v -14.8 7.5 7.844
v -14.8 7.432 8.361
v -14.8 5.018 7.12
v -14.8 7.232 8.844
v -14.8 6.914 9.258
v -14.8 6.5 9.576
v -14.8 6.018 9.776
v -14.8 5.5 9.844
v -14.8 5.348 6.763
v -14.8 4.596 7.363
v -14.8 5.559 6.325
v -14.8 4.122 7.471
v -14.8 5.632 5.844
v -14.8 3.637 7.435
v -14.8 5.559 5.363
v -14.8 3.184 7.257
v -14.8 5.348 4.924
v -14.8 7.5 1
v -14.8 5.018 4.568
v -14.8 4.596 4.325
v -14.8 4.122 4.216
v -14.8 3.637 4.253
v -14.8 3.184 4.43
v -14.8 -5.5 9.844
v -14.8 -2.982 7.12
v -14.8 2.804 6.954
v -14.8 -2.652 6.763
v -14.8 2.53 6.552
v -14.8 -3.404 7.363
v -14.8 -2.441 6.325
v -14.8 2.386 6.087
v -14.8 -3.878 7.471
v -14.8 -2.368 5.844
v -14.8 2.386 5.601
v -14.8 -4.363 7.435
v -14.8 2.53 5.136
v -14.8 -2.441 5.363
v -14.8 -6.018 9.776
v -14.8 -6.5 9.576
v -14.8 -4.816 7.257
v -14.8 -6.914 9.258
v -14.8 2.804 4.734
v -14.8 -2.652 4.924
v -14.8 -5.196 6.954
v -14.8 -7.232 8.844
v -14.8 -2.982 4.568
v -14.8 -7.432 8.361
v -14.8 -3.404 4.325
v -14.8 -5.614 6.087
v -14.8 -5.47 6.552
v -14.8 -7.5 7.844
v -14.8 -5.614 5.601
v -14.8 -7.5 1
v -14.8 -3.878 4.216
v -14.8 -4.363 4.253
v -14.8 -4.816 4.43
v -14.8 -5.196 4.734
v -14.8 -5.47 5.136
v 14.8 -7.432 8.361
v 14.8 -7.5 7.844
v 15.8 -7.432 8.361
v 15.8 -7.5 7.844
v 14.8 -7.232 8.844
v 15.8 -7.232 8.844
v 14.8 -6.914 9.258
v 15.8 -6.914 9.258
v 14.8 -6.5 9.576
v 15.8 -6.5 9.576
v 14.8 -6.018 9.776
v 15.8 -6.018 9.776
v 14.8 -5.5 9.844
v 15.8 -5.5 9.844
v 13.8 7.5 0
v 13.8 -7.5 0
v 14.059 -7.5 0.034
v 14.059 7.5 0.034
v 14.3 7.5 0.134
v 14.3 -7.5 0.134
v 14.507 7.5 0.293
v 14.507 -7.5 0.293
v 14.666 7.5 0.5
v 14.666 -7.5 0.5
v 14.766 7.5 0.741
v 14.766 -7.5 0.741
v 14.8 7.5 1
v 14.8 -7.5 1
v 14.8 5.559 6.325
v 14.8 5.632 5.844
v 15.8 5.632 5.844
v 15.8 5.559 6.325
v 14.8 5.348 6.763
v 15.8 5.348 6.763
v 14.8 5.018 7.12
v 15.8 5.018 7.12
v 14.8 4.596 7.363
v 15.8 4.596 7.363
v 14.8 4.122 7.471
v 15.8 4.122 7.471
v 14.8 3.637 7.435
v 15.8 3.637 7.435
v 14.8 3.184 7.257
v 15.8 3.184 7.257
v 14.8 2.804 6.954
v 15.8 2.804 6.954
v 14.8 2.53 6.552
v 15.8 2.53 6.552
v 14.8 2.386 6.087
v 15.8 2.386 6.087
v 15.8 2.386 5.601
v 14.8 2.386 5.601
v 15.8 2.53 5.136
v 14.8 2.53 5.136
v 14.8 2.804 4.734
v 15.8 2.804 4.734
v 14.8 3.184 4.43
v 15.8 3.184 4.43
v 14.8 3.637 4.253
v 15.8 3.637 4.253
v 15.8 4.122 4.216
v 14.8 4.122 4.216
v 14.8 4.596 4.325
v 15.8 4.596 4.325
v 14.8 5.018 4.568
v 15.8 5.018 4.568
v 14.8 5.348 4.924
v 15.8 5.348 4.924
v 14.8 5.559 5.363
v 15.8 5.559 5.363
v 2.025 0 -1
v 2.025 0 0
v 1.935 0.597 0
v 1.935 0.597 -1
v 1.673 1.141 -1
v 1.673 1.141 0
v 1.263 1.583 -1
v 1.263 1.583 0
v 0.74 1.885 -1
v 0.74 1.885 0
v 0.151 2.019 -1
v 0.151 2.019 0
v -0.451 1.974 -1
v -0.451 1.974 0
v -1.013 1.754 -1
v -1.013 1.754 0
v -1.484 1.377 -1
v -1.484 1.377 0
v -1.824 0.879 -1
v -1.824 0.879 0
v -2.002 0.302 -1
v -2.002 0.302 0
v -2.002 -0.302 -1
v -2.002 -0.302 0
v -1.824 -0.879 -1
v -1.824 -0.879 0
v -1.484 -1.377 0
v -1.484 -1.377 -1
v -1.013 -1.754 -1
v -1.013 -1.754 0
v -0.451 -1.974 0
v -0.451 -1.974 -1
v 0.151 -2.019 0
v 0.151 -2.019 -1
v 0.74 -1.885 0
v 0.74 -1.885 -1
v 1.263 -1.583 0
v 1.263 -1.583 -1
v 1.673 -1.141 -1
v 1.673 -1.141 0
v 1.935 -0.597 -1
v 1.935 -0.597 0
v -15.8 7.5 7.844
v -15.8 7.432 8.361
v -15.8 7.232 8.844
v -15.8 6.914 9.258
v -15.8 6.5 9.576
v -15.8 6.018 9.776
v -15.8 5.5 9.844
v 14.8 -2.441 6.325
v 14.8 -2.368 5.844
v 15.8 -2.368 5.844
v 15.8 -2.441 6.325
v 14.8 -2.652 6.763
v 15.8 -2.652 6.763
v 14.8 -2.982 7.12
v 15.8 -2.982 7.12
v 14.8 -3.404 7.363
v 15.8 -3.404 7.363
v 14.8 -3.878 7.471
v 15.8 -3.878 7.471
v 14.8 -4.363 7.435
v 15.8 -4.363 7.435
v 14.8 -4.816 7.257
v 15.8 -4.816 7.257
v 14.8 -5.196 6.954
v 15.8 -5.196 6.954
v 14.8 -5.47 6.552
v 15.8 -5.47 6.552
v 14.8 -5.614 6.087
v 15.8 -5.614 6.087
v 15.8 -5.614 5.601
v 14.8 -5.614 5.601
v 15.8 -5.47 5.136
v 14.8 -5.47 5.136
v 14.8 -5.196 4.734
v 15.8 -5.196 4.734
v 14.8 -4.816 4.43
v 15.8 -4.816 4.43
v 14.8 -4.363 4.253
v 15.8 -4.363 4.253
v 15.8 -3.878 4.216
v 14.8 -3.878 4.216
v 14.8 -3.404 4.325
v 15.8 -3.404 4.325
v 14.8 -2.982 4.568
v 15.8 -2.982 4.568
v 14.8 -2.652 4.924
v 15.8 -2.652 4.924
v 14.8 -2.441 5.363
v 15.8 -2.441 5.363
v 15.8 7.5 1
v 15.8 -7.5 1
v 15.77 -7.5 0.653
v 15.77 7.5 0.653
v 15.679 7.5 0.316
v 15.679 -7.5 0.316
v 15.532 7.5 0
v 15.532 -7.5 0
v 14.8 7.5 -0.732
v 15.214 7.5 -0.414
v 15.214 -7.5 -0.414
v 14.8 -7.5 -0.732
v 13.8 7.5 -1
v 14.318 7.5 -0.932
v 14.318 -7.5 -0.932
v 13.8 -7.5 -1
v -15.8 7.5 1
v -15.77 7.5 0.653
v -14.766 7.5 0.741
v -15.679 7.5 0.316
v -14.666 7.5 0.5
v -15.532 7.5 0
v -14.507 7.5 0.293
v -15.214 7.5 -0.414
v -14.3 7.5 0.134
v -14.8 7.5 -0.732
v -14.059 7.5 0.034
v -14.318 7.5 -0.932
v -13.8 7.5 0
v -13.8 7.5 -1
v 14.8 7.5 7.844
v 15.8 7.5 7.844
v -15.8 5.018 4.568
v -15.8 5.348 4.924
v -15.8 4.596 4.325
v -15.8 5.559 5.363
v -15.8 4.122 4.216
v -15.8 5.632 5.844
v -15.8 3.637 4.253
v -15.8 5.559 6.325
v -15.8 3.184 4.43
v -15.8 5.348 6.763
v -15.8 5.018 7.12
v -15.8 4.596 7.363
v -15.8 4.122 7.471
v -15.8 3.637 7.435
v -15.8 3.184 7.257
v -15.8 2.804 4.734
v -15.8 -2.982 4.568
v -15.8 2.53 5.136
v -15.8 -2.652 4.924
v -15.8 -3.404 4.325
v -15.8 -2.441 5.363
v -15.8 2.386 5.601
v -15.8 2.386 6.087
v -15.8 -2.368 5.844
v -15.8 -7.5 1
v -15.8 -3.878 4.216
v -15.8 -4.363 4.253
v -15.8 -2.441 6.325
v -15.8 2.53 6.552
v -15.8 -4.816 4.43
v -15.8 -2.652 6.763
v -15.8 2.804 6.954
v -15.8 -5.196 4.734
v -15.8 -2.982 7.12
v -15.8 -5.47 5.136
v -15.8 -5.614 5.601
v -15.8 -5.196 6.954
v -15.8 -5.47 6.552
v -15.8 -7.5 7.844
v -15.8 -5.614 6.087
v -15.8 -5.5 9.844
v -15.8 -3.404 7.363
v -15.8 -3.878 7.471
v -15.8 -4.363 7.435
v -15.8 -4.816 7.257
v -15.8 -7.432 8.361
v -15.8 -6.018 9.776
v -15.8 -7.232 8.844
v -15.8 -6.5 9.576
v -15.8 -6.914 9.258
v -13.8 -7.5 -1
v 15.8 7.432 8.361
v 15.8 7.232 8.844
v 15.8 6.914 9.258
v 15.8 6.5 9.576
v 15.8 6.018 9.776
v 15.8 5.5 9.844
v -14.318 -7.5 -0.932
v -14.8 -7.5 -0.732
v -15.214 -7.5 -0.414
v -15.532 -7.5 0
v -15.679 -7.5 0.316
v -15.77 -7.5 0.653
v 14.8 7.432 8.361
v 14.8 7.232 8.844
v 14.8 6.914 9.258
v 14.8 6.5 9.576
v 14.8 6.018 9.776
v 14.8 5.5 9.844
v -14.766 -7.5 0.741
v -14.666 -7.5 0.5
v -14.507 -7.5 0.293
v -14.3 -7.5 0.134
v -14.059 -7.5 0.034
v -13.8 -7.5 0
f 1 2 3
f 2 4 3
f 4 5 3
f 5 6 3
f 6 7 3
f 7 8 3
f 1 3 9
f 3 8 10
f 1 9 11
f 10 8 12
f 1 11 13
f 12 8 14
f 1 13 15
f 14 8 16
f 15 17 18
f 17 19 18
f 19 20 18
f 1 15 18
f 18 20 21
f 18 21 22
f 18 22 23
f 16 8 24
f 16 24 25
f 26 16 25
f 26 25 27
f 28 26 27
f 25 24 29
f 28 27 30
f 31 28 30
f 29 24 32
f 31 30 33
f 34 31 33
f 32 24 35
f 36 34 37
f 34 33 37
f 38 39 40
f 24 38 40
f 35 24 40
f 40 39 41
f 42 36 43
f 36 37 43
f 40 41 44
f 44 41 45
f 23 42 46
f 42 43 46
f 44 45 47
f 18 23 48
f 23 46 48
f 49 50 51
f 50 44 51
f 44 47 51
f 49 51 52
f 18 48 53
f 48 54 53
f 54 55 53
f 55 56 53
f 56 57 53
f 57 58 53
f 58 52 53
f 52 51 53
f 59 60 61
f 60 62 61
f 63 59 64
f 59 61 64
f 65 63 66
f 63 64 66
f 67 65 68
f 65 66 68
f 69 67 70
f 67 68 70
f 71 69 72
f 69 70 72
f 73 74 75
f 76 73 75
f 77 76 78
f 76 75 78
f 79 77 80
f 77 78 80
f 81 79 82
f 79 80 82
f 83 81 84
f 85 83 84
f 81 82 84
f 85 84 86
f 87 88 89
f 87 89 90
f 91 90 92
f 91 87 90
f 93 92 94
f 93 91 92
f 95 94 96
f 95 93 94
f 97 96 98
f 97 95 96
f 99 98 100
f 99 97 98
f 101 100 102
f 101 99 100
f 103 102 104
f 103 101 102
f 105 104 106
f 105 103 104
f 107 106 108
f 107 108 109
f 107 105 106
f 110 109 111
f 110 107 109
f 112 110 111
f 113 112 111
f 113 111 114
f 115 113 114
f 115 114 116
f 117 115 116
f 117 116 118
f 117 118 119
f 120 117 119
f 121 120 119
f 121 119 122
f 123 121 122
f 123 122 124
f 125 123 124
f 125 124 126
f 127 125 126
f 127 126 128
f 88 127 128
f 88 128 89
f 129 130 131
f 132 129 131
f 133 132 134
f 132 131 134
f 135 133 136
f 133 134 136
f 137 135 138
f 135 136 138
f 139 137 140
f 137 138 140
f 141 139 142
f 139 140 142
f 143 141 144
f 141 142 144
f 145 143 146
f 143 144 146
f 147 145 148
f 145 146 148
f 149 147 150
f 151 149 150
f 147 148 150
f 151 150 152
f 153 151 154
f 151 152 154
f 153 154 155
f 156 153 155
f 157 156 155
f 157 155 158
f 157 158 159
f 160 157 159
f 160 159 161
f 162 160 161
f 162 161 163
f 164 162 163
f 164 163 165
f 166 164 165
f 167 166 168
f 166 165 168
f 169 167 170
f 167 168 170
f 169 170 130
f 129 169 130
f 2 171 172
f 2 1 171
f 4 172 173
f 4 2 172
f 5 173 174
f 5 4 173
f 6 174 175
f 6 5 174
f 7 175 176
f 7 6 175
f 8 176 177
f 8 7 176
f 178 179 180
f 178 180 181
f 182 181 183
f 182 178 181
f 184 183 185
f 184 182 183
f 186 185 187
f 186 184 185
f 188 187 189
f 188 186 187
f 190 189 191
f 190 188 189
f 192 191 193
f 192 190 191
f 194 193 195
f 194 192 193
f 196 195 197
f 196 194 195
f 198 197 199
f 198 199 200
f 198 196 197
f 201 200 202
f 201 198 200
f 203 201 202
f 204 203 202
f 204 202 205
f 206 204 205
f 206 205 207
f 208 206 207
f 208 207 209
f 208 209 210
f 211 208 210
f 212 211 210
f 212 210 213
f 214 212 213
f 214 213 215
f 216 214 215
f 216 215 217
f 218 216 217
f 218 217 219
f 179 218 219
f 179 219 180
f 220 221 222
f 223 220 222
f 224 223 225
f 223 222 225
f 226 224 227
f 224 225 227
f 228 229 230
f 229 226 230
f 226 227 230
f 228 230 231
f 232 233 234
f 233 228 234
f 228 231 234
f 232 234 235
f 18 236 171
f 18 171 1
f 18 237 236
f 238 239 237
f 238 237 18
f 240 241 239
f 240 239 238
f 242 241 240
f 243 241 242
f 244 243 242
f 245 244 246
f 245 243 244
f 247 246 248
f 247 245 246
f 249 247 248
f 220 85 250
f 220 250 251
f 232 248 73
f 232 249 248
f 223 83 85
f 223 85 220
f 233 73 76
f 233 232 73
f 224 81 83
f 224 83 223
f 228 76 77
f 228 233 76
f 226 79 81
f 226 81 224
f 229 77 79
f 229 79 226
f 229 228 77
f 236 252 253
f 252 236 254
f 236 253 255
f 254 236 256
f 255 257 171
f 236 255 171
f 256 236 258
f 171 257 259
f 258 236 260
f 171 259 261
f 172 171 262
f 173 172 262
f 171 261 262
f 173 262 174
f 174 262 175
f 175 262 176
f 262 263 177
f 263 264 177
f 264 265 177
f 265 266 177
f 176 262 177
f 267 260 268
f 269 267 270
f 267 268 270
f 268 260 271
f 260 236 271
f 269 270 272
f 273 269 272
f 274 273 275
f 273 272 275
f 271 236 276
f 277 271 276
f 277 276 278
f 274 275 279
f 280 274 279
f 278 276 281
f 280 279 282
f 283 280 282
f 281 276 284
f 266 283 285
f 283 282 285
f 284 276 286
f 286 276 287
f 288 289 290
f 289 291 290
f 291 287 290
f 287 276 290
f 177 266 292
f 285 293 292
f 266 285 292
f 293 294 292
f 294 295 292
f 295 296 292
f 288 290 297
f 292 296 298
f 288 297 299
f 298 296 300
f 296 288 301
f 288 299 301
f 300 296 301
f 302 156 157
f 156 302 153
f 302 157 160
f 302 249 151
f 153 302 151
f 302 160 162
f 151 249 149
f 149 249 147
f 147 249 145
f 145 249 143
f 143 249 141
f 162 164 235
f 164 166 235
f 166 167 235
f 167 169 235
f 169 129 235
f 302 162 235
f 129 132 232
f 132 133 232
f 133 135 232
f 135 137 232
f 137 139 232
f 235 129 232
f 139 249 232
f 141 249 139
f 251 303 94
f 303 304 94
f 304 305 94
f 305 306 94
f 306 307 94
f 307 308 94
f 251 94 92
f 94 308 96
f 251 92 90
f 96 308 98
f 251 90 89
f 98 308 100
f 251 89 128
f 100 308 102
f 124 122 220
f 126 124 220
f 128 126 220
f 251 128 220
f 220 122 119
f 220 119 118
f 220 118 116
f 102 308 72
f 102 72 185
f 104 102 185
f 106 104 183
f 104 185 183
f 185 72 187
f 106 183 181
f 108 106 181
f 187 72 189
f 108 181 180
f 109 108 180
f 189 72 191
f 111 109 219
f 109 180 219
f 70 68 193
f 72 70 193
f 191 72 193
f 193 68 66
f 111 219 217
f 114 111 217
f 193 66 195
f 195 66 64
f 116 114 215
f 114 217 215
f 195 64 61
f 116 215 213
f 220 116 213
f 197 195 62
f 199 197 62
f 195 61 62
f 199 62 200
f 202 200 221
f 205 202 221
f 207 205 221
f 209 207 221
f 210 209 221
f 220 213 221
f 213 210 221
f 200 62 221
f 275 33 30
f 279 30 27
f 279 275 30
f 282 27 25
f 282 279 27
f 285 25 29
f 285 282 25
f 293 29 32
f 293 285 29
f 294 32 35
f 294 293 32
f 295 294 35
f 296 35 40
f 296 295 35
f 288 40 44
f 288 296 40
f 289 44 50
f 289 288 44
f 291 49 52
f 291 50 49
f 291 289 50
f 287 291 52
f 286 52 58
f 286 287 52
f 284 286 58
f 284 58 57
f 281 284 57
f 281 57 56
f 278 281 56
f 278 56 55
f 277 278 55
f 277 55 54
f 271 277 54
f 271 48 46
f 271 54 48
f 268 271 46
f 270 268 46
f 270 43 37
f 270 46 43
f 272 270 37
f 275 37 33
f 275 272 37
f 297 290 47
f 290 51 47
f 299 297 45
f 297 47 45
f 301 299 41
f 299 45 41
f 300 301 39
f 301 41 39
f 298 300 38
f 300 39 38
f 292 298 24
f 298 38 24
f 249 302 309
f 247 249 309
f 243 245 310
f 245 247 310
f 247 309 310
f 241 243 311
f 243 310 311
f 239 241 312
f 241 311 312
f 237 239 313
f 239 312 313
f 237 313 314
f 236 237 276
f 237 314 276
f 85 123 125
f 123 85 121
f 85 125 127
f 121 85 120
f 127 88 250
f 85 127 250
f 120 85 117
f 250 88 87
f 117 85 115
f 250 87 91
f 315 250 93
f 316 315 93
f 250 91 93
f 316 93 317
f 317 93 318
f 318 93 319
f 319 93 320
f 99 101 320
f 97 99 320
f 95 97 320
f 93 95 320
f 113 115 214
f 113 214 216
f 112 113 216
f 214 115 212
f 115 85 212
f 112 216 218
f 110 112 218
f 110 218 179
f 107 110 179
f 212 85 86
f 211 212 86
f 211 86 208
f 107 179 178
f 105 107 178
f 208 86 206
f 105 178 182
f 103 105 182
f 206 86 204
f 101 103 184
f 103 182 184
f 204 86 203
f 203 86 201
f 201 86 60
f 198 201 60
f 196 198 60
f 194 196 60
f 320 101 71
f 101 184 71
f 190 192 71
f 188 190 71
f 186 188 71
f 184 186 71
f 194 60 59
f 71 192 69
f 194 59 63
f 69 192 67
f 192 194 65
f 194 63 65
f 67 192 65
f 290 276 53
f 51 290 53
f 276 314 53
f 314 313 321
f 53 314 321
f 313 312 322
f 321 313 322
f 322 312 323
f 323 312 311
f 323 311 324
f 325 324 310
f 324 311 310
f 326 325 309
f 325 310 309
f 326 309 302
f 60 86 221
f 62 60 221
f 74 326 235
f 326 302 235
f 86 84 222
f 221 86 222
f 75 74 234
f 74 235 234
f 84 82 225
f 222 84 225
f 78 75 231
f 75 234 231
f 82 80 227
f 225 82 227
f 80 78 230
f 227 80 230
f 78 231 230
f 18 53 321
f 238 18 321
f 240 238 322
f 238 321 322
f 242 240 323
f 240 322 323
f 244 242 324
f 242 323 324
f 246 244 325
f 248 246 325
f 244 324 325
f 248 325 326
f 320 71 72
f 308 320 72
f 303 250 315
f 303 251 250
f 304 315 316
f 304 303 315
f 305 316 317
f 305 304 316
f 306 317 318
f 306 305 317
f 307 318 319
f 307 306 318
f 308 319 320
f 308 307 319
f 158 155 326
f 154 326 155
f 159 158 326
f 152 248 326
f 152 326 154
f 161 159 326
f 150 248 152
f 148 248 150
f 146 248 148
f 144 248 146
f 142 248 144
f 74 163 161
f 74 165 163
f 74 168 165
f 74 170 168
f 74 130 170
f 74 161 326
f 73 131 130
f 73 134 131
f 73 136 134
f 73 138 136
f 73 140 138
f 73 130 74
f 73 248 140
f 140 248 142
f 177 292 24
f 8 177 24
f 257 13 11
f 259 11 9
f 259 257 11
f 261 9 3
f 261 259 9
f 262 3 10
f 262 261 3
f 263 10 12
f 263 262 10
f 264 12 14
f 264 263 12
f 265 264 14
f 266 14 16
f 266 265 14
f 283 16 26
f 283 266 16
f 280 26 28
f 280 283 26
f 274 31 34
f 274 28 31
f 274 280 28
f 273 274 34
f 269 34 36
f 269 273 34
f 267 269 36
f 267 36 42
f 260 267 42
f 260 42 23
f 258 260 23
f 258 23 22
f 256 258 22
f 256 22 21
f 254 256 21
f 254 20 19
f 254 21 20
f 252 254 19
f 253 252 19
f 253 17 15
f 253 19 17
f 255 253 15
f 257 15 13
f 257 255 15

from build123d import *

# Parameters (mm, degrees)
SKETCH1_W                  = 50
SKETCH1_H                  = 15
SKETCH1_R                  = 2.025
BASE_FLANGE1_DEPTH         = 1
F_4_CLEARANCE_HOLE1_D      = 3.2639
SKETCHED_START             = -7.5
SKETCHED_BEND1_DEPTH       = 15
SKETCHED_START_2           = -2.3680499
SKETCHED_BEND1_2_DEPTH     = 4.7360998
SKETCHED_BEND1_3_DEPTH     = 1.8680499
SKETCHED_START_3           = 5.6319501
SKETCHED_BEND1_4_DEPTH     = 1.8680499
SKETCHED_START_4           = -5.6319501
SKETCHED_BEND1_5_DEPTH     = 11.2639002
SKETCHED_START_5           = -15.8
SKETCHED_BEND1_6_OUTLINE_R = 1.63195
SKETCHED_BEND1_6_DEPTH     = 31.6
FILLET1_R                  = 2


with BuildPart() as part:
    # Base-Flange1: sheet metal written as solids
    # Sketch1 → Base-Flange1 (new body)
    with BuildSketch(Plane.XY):
        Rectangle(SKETCH1_W, SKETCH1_H)
        Circle(SKETCH1_R, mode=Mode.SUBTRACT)
    extrude(amount=-BASE_FLANGE1_DEPTH)

    # #4 Clearance Hole1 (through all)
    with Locations(Plane.XY):
        with Locations((-21, 4), (-21, -4), (21, 4), (21, -4)):
            Hole(F_4_CLEARANCE_HOLE1_D / 2)

    # Sketched Bend1: read off the stored shape, not the designer's step
    # Sketched Bend1 outline → Sketched Bend1 (cut)
    with BuildSketch(Plane(origin=(0, 0, 0), x_dir=(1, 0, 0), z_dir=(0, 1, 0)).offset(SKETCHED_START)):
        with BuildLine():
            ThreePointArc((-15.532050807, 0), (-14.8, 0.732050807), (-13.8, 1))
            Line((-13.8, 1), (-25, 1))
            Line((-25, 1), (-25, 0))
            Line((-25, 0), (-15.532050807, 0))
        make_face()
        with BuildLine():
            Line((25, 1), (13.8, 1))
            ThreePointArc((13.8, 1), (14.8, 0.732050807), (15.532050807, 0))
            Line((15.532050807, 0), (25, 0))
            Line((25, 0), (25, 1))
        make_face()
    extrude(amount=SKETCHED_BEND1_DEPTH, mode=Mode.SUBTRACT)

    # Sketched Bend1 2 outline → Sketched Bend1 2 (add)
    with BuildSketch(Plane(origin=(0, 0, 0), x_dir=(1, 0, 0), z_dir=(0, 1, 0)).offset(SKETCHED_START_2)):
        with BuildLine():
            Line((-13.8, 0), (-15.532050807, 0))
            ThreePointArc((-15.532050807, 0), (-15.731851652, -0.48236191), (-15.8, -1))
            Line((-15.8, -1), (-15.8, -9.84380551))
            Line((-15.8, -9.84380551), (-14.8, -9.84380551))
            Line((-14.8, -9.84380551), (-14.8, -1))
            ThreePointArc((-14.8, -1), (-14.507106781, -0.292893219), (-13.8, 0))
        make_face()
        with BuildLine():
            ThreePointArc((15.8, -1), (15.731851652, -0.48236191), (15.532050807, 0))
            Line((15.532050807, 0), (13.8, 0))
            ThreePointArc((13.8, 0), (14.507106781, -0.292893219), (14.8, -1))
            Line((14.8, -1), (14.8, -9.84380551))
            Line((14.8, -9.84380551), (15.8, -9.84380551))
            Line((15.8, -9.84380551), (15.8, -1))
        make_face()
    extrude(amount=SKETCHED_BEND1_2_DEPTH)

    # Sketched Bend1 3 outline → Sketched Bend1 3 (add)
    with BuildSketch(Plane(origin=(0, 0, 0), x_dir=(1, 0, 0), z_dir=(0, 1, 0)).offset(SKETCHED_START)):
        with BuildLine():
            Line((-13.8, 0), (-15.532050807, 0))
            ThreePointArc((-15.532050807, 0), (-15.731851652, -0.48236191), (-15.8, -1))
            Line((-15.8, -1), (-15.8, -9.84380551))
            Line((-15.8, -9.84380551), (-14.8, -9.84380551))
            Line((-14.8, -9.84380551), (-14.8, -1))
            ThreePointArc((-14.8, -1), (-14.507106781, -0.292893219), (-13.8, 0))
        make_face()
        with BuildLine():
            ThreePointArc((15.8, -1), (15.731851652, -0.48236191), (15.532050807, 0))
            Line((15.532050807, 0), (13.8, 0))
            ThreePointArc((13.8, 0), (14.507106781, -0.292893219), (14.8, -1))
            Line((14.8, -1), (14.8, -9.84380551))
            Line((14.8, -9.84380551), (15.8, -9.84380551))
            Line((15.8, -9.84380551), (15.8, -1))
        make_face()
    extrude(amount=SKETCHED_BEND1_3_DEPTH)

    # Sketched Bend1 4 outline → Sketched Bend1 4 (add)
    with BuildSketch(Plane(origin=(0, 0, 0), x_dir=(1, 0, 0), z_dir=(0, 1, 0)).offset(SKETCHED_START_3)):
        with BuildLine():
            Line((-13.8, 0), (-15.532050807, 0))
            ThreePointArc((-15.532050807, 0), (-15.731851652, -0.48236191), (-15.8, -1))
            Line((-15.8, -1), (-15.8, -9.84380551))
            Line((-15.8, -9.84380551), (-14.8, -9.84380551))
            Line((-14.8, -9.84380551), (-14.8, -1))
            ThreePointArc((-14.8, -1), (-14.507106781, -0.292893219), (-13.8, 0))
        make_face()
        with BuildLine():
            ThreePointArc((15.8, -1), (15.731851652, -0.48236191), (15.532050807, 0))
            Line((15.532050807, 0), (13.8, 0))
            ThreePointArc((13.8, 0), (14.507106781, -0.292893219), (14.8, -1))
            Line((14.8, -1), (14.8, -9.84380551))
            Line((14.8, -9.84380551), (15.8, -9.84380551))
            Line((15.8, -9.84380551), (15.8, -1))
        make_face()
    extrude(amount=SKETCHED_BEND1_4_DEPTH)

    # Sketched Bend1 5 outline → Sketched Bend1 5 (add)
    with BuildSketch(Plane(origin=(0, 0, 0), x_dir=(1, 0, 0), z_dir=(0, 1, 0)).offset(SKETCHED_START_4)):
        with BuildLine():
            Line((-13.8, 0), (-15.532050807, 0))
            ThreePointArc((-15.532050807, 0), (-15.731851652, -0.48236191), (-15.8, -1))
            Line((-15.8, -1), (-15.8, -9.84380551))
            Line((-15.8, -9.84380551), (-14.8, -9.84380551))
            Line((-14.8, -9.84380551), (-14.8, -1))
            ThreePointArc((-14.8, -1), (-14.507106781, -0.292893219), (-13.8, 0))
        make_face()
        with BuildLine():
            Line((15.532050807, 0), (13.8, 0))
            ThreePointArc((13.8, 0), (14.507106781, -0.292893219), (14.8, -1))
            Line((14.8, -1), (14.8, -9.84380551))
            Line((14.8, -9.84380551), (15.8, -9.84380551))
            Line((15.8, -9.84380551), (15.8, -1))
            ThreePointArc((15.8, -1), (15.731851652, -0.48236191), (15.532050807, 0))
        make_face()
    extrude(amount=SKETCHED_BEND1_5_DEPTH)

    # Sketched Bend1 6 outline → Sketched Bend1 6 (cut)
    with BuildSketch(Plane.YZ.offset(SKETCHED_START_5)):
        with Locations((-4, 5.84380551)):
            Circle(SKETCHED_BEND1_6_OUTLINE_R)
        with Locations((4, 5.84380551)):
            Circle(SKETCHED_BEND1_6_OUTLINE_R)
    extrude(amount=SKETCHED_BEND1_6_DEPTH, mode=Mode.SUBTRACT)

    # Fillet1
    fillet1_edges = [part.edges().sort_by_distance(p)[0] for p in [
        (15.3, 7.5, 9.84380551),
        (15.3, -7.5, 9.84380551),
        (-15.3, -7.5, 9.84380551),
        (-15.3, 7.5, 9.84380551),
    ]]
    fillet(fillet1_edges, radius=FILLET1_R)


solid = part.part
